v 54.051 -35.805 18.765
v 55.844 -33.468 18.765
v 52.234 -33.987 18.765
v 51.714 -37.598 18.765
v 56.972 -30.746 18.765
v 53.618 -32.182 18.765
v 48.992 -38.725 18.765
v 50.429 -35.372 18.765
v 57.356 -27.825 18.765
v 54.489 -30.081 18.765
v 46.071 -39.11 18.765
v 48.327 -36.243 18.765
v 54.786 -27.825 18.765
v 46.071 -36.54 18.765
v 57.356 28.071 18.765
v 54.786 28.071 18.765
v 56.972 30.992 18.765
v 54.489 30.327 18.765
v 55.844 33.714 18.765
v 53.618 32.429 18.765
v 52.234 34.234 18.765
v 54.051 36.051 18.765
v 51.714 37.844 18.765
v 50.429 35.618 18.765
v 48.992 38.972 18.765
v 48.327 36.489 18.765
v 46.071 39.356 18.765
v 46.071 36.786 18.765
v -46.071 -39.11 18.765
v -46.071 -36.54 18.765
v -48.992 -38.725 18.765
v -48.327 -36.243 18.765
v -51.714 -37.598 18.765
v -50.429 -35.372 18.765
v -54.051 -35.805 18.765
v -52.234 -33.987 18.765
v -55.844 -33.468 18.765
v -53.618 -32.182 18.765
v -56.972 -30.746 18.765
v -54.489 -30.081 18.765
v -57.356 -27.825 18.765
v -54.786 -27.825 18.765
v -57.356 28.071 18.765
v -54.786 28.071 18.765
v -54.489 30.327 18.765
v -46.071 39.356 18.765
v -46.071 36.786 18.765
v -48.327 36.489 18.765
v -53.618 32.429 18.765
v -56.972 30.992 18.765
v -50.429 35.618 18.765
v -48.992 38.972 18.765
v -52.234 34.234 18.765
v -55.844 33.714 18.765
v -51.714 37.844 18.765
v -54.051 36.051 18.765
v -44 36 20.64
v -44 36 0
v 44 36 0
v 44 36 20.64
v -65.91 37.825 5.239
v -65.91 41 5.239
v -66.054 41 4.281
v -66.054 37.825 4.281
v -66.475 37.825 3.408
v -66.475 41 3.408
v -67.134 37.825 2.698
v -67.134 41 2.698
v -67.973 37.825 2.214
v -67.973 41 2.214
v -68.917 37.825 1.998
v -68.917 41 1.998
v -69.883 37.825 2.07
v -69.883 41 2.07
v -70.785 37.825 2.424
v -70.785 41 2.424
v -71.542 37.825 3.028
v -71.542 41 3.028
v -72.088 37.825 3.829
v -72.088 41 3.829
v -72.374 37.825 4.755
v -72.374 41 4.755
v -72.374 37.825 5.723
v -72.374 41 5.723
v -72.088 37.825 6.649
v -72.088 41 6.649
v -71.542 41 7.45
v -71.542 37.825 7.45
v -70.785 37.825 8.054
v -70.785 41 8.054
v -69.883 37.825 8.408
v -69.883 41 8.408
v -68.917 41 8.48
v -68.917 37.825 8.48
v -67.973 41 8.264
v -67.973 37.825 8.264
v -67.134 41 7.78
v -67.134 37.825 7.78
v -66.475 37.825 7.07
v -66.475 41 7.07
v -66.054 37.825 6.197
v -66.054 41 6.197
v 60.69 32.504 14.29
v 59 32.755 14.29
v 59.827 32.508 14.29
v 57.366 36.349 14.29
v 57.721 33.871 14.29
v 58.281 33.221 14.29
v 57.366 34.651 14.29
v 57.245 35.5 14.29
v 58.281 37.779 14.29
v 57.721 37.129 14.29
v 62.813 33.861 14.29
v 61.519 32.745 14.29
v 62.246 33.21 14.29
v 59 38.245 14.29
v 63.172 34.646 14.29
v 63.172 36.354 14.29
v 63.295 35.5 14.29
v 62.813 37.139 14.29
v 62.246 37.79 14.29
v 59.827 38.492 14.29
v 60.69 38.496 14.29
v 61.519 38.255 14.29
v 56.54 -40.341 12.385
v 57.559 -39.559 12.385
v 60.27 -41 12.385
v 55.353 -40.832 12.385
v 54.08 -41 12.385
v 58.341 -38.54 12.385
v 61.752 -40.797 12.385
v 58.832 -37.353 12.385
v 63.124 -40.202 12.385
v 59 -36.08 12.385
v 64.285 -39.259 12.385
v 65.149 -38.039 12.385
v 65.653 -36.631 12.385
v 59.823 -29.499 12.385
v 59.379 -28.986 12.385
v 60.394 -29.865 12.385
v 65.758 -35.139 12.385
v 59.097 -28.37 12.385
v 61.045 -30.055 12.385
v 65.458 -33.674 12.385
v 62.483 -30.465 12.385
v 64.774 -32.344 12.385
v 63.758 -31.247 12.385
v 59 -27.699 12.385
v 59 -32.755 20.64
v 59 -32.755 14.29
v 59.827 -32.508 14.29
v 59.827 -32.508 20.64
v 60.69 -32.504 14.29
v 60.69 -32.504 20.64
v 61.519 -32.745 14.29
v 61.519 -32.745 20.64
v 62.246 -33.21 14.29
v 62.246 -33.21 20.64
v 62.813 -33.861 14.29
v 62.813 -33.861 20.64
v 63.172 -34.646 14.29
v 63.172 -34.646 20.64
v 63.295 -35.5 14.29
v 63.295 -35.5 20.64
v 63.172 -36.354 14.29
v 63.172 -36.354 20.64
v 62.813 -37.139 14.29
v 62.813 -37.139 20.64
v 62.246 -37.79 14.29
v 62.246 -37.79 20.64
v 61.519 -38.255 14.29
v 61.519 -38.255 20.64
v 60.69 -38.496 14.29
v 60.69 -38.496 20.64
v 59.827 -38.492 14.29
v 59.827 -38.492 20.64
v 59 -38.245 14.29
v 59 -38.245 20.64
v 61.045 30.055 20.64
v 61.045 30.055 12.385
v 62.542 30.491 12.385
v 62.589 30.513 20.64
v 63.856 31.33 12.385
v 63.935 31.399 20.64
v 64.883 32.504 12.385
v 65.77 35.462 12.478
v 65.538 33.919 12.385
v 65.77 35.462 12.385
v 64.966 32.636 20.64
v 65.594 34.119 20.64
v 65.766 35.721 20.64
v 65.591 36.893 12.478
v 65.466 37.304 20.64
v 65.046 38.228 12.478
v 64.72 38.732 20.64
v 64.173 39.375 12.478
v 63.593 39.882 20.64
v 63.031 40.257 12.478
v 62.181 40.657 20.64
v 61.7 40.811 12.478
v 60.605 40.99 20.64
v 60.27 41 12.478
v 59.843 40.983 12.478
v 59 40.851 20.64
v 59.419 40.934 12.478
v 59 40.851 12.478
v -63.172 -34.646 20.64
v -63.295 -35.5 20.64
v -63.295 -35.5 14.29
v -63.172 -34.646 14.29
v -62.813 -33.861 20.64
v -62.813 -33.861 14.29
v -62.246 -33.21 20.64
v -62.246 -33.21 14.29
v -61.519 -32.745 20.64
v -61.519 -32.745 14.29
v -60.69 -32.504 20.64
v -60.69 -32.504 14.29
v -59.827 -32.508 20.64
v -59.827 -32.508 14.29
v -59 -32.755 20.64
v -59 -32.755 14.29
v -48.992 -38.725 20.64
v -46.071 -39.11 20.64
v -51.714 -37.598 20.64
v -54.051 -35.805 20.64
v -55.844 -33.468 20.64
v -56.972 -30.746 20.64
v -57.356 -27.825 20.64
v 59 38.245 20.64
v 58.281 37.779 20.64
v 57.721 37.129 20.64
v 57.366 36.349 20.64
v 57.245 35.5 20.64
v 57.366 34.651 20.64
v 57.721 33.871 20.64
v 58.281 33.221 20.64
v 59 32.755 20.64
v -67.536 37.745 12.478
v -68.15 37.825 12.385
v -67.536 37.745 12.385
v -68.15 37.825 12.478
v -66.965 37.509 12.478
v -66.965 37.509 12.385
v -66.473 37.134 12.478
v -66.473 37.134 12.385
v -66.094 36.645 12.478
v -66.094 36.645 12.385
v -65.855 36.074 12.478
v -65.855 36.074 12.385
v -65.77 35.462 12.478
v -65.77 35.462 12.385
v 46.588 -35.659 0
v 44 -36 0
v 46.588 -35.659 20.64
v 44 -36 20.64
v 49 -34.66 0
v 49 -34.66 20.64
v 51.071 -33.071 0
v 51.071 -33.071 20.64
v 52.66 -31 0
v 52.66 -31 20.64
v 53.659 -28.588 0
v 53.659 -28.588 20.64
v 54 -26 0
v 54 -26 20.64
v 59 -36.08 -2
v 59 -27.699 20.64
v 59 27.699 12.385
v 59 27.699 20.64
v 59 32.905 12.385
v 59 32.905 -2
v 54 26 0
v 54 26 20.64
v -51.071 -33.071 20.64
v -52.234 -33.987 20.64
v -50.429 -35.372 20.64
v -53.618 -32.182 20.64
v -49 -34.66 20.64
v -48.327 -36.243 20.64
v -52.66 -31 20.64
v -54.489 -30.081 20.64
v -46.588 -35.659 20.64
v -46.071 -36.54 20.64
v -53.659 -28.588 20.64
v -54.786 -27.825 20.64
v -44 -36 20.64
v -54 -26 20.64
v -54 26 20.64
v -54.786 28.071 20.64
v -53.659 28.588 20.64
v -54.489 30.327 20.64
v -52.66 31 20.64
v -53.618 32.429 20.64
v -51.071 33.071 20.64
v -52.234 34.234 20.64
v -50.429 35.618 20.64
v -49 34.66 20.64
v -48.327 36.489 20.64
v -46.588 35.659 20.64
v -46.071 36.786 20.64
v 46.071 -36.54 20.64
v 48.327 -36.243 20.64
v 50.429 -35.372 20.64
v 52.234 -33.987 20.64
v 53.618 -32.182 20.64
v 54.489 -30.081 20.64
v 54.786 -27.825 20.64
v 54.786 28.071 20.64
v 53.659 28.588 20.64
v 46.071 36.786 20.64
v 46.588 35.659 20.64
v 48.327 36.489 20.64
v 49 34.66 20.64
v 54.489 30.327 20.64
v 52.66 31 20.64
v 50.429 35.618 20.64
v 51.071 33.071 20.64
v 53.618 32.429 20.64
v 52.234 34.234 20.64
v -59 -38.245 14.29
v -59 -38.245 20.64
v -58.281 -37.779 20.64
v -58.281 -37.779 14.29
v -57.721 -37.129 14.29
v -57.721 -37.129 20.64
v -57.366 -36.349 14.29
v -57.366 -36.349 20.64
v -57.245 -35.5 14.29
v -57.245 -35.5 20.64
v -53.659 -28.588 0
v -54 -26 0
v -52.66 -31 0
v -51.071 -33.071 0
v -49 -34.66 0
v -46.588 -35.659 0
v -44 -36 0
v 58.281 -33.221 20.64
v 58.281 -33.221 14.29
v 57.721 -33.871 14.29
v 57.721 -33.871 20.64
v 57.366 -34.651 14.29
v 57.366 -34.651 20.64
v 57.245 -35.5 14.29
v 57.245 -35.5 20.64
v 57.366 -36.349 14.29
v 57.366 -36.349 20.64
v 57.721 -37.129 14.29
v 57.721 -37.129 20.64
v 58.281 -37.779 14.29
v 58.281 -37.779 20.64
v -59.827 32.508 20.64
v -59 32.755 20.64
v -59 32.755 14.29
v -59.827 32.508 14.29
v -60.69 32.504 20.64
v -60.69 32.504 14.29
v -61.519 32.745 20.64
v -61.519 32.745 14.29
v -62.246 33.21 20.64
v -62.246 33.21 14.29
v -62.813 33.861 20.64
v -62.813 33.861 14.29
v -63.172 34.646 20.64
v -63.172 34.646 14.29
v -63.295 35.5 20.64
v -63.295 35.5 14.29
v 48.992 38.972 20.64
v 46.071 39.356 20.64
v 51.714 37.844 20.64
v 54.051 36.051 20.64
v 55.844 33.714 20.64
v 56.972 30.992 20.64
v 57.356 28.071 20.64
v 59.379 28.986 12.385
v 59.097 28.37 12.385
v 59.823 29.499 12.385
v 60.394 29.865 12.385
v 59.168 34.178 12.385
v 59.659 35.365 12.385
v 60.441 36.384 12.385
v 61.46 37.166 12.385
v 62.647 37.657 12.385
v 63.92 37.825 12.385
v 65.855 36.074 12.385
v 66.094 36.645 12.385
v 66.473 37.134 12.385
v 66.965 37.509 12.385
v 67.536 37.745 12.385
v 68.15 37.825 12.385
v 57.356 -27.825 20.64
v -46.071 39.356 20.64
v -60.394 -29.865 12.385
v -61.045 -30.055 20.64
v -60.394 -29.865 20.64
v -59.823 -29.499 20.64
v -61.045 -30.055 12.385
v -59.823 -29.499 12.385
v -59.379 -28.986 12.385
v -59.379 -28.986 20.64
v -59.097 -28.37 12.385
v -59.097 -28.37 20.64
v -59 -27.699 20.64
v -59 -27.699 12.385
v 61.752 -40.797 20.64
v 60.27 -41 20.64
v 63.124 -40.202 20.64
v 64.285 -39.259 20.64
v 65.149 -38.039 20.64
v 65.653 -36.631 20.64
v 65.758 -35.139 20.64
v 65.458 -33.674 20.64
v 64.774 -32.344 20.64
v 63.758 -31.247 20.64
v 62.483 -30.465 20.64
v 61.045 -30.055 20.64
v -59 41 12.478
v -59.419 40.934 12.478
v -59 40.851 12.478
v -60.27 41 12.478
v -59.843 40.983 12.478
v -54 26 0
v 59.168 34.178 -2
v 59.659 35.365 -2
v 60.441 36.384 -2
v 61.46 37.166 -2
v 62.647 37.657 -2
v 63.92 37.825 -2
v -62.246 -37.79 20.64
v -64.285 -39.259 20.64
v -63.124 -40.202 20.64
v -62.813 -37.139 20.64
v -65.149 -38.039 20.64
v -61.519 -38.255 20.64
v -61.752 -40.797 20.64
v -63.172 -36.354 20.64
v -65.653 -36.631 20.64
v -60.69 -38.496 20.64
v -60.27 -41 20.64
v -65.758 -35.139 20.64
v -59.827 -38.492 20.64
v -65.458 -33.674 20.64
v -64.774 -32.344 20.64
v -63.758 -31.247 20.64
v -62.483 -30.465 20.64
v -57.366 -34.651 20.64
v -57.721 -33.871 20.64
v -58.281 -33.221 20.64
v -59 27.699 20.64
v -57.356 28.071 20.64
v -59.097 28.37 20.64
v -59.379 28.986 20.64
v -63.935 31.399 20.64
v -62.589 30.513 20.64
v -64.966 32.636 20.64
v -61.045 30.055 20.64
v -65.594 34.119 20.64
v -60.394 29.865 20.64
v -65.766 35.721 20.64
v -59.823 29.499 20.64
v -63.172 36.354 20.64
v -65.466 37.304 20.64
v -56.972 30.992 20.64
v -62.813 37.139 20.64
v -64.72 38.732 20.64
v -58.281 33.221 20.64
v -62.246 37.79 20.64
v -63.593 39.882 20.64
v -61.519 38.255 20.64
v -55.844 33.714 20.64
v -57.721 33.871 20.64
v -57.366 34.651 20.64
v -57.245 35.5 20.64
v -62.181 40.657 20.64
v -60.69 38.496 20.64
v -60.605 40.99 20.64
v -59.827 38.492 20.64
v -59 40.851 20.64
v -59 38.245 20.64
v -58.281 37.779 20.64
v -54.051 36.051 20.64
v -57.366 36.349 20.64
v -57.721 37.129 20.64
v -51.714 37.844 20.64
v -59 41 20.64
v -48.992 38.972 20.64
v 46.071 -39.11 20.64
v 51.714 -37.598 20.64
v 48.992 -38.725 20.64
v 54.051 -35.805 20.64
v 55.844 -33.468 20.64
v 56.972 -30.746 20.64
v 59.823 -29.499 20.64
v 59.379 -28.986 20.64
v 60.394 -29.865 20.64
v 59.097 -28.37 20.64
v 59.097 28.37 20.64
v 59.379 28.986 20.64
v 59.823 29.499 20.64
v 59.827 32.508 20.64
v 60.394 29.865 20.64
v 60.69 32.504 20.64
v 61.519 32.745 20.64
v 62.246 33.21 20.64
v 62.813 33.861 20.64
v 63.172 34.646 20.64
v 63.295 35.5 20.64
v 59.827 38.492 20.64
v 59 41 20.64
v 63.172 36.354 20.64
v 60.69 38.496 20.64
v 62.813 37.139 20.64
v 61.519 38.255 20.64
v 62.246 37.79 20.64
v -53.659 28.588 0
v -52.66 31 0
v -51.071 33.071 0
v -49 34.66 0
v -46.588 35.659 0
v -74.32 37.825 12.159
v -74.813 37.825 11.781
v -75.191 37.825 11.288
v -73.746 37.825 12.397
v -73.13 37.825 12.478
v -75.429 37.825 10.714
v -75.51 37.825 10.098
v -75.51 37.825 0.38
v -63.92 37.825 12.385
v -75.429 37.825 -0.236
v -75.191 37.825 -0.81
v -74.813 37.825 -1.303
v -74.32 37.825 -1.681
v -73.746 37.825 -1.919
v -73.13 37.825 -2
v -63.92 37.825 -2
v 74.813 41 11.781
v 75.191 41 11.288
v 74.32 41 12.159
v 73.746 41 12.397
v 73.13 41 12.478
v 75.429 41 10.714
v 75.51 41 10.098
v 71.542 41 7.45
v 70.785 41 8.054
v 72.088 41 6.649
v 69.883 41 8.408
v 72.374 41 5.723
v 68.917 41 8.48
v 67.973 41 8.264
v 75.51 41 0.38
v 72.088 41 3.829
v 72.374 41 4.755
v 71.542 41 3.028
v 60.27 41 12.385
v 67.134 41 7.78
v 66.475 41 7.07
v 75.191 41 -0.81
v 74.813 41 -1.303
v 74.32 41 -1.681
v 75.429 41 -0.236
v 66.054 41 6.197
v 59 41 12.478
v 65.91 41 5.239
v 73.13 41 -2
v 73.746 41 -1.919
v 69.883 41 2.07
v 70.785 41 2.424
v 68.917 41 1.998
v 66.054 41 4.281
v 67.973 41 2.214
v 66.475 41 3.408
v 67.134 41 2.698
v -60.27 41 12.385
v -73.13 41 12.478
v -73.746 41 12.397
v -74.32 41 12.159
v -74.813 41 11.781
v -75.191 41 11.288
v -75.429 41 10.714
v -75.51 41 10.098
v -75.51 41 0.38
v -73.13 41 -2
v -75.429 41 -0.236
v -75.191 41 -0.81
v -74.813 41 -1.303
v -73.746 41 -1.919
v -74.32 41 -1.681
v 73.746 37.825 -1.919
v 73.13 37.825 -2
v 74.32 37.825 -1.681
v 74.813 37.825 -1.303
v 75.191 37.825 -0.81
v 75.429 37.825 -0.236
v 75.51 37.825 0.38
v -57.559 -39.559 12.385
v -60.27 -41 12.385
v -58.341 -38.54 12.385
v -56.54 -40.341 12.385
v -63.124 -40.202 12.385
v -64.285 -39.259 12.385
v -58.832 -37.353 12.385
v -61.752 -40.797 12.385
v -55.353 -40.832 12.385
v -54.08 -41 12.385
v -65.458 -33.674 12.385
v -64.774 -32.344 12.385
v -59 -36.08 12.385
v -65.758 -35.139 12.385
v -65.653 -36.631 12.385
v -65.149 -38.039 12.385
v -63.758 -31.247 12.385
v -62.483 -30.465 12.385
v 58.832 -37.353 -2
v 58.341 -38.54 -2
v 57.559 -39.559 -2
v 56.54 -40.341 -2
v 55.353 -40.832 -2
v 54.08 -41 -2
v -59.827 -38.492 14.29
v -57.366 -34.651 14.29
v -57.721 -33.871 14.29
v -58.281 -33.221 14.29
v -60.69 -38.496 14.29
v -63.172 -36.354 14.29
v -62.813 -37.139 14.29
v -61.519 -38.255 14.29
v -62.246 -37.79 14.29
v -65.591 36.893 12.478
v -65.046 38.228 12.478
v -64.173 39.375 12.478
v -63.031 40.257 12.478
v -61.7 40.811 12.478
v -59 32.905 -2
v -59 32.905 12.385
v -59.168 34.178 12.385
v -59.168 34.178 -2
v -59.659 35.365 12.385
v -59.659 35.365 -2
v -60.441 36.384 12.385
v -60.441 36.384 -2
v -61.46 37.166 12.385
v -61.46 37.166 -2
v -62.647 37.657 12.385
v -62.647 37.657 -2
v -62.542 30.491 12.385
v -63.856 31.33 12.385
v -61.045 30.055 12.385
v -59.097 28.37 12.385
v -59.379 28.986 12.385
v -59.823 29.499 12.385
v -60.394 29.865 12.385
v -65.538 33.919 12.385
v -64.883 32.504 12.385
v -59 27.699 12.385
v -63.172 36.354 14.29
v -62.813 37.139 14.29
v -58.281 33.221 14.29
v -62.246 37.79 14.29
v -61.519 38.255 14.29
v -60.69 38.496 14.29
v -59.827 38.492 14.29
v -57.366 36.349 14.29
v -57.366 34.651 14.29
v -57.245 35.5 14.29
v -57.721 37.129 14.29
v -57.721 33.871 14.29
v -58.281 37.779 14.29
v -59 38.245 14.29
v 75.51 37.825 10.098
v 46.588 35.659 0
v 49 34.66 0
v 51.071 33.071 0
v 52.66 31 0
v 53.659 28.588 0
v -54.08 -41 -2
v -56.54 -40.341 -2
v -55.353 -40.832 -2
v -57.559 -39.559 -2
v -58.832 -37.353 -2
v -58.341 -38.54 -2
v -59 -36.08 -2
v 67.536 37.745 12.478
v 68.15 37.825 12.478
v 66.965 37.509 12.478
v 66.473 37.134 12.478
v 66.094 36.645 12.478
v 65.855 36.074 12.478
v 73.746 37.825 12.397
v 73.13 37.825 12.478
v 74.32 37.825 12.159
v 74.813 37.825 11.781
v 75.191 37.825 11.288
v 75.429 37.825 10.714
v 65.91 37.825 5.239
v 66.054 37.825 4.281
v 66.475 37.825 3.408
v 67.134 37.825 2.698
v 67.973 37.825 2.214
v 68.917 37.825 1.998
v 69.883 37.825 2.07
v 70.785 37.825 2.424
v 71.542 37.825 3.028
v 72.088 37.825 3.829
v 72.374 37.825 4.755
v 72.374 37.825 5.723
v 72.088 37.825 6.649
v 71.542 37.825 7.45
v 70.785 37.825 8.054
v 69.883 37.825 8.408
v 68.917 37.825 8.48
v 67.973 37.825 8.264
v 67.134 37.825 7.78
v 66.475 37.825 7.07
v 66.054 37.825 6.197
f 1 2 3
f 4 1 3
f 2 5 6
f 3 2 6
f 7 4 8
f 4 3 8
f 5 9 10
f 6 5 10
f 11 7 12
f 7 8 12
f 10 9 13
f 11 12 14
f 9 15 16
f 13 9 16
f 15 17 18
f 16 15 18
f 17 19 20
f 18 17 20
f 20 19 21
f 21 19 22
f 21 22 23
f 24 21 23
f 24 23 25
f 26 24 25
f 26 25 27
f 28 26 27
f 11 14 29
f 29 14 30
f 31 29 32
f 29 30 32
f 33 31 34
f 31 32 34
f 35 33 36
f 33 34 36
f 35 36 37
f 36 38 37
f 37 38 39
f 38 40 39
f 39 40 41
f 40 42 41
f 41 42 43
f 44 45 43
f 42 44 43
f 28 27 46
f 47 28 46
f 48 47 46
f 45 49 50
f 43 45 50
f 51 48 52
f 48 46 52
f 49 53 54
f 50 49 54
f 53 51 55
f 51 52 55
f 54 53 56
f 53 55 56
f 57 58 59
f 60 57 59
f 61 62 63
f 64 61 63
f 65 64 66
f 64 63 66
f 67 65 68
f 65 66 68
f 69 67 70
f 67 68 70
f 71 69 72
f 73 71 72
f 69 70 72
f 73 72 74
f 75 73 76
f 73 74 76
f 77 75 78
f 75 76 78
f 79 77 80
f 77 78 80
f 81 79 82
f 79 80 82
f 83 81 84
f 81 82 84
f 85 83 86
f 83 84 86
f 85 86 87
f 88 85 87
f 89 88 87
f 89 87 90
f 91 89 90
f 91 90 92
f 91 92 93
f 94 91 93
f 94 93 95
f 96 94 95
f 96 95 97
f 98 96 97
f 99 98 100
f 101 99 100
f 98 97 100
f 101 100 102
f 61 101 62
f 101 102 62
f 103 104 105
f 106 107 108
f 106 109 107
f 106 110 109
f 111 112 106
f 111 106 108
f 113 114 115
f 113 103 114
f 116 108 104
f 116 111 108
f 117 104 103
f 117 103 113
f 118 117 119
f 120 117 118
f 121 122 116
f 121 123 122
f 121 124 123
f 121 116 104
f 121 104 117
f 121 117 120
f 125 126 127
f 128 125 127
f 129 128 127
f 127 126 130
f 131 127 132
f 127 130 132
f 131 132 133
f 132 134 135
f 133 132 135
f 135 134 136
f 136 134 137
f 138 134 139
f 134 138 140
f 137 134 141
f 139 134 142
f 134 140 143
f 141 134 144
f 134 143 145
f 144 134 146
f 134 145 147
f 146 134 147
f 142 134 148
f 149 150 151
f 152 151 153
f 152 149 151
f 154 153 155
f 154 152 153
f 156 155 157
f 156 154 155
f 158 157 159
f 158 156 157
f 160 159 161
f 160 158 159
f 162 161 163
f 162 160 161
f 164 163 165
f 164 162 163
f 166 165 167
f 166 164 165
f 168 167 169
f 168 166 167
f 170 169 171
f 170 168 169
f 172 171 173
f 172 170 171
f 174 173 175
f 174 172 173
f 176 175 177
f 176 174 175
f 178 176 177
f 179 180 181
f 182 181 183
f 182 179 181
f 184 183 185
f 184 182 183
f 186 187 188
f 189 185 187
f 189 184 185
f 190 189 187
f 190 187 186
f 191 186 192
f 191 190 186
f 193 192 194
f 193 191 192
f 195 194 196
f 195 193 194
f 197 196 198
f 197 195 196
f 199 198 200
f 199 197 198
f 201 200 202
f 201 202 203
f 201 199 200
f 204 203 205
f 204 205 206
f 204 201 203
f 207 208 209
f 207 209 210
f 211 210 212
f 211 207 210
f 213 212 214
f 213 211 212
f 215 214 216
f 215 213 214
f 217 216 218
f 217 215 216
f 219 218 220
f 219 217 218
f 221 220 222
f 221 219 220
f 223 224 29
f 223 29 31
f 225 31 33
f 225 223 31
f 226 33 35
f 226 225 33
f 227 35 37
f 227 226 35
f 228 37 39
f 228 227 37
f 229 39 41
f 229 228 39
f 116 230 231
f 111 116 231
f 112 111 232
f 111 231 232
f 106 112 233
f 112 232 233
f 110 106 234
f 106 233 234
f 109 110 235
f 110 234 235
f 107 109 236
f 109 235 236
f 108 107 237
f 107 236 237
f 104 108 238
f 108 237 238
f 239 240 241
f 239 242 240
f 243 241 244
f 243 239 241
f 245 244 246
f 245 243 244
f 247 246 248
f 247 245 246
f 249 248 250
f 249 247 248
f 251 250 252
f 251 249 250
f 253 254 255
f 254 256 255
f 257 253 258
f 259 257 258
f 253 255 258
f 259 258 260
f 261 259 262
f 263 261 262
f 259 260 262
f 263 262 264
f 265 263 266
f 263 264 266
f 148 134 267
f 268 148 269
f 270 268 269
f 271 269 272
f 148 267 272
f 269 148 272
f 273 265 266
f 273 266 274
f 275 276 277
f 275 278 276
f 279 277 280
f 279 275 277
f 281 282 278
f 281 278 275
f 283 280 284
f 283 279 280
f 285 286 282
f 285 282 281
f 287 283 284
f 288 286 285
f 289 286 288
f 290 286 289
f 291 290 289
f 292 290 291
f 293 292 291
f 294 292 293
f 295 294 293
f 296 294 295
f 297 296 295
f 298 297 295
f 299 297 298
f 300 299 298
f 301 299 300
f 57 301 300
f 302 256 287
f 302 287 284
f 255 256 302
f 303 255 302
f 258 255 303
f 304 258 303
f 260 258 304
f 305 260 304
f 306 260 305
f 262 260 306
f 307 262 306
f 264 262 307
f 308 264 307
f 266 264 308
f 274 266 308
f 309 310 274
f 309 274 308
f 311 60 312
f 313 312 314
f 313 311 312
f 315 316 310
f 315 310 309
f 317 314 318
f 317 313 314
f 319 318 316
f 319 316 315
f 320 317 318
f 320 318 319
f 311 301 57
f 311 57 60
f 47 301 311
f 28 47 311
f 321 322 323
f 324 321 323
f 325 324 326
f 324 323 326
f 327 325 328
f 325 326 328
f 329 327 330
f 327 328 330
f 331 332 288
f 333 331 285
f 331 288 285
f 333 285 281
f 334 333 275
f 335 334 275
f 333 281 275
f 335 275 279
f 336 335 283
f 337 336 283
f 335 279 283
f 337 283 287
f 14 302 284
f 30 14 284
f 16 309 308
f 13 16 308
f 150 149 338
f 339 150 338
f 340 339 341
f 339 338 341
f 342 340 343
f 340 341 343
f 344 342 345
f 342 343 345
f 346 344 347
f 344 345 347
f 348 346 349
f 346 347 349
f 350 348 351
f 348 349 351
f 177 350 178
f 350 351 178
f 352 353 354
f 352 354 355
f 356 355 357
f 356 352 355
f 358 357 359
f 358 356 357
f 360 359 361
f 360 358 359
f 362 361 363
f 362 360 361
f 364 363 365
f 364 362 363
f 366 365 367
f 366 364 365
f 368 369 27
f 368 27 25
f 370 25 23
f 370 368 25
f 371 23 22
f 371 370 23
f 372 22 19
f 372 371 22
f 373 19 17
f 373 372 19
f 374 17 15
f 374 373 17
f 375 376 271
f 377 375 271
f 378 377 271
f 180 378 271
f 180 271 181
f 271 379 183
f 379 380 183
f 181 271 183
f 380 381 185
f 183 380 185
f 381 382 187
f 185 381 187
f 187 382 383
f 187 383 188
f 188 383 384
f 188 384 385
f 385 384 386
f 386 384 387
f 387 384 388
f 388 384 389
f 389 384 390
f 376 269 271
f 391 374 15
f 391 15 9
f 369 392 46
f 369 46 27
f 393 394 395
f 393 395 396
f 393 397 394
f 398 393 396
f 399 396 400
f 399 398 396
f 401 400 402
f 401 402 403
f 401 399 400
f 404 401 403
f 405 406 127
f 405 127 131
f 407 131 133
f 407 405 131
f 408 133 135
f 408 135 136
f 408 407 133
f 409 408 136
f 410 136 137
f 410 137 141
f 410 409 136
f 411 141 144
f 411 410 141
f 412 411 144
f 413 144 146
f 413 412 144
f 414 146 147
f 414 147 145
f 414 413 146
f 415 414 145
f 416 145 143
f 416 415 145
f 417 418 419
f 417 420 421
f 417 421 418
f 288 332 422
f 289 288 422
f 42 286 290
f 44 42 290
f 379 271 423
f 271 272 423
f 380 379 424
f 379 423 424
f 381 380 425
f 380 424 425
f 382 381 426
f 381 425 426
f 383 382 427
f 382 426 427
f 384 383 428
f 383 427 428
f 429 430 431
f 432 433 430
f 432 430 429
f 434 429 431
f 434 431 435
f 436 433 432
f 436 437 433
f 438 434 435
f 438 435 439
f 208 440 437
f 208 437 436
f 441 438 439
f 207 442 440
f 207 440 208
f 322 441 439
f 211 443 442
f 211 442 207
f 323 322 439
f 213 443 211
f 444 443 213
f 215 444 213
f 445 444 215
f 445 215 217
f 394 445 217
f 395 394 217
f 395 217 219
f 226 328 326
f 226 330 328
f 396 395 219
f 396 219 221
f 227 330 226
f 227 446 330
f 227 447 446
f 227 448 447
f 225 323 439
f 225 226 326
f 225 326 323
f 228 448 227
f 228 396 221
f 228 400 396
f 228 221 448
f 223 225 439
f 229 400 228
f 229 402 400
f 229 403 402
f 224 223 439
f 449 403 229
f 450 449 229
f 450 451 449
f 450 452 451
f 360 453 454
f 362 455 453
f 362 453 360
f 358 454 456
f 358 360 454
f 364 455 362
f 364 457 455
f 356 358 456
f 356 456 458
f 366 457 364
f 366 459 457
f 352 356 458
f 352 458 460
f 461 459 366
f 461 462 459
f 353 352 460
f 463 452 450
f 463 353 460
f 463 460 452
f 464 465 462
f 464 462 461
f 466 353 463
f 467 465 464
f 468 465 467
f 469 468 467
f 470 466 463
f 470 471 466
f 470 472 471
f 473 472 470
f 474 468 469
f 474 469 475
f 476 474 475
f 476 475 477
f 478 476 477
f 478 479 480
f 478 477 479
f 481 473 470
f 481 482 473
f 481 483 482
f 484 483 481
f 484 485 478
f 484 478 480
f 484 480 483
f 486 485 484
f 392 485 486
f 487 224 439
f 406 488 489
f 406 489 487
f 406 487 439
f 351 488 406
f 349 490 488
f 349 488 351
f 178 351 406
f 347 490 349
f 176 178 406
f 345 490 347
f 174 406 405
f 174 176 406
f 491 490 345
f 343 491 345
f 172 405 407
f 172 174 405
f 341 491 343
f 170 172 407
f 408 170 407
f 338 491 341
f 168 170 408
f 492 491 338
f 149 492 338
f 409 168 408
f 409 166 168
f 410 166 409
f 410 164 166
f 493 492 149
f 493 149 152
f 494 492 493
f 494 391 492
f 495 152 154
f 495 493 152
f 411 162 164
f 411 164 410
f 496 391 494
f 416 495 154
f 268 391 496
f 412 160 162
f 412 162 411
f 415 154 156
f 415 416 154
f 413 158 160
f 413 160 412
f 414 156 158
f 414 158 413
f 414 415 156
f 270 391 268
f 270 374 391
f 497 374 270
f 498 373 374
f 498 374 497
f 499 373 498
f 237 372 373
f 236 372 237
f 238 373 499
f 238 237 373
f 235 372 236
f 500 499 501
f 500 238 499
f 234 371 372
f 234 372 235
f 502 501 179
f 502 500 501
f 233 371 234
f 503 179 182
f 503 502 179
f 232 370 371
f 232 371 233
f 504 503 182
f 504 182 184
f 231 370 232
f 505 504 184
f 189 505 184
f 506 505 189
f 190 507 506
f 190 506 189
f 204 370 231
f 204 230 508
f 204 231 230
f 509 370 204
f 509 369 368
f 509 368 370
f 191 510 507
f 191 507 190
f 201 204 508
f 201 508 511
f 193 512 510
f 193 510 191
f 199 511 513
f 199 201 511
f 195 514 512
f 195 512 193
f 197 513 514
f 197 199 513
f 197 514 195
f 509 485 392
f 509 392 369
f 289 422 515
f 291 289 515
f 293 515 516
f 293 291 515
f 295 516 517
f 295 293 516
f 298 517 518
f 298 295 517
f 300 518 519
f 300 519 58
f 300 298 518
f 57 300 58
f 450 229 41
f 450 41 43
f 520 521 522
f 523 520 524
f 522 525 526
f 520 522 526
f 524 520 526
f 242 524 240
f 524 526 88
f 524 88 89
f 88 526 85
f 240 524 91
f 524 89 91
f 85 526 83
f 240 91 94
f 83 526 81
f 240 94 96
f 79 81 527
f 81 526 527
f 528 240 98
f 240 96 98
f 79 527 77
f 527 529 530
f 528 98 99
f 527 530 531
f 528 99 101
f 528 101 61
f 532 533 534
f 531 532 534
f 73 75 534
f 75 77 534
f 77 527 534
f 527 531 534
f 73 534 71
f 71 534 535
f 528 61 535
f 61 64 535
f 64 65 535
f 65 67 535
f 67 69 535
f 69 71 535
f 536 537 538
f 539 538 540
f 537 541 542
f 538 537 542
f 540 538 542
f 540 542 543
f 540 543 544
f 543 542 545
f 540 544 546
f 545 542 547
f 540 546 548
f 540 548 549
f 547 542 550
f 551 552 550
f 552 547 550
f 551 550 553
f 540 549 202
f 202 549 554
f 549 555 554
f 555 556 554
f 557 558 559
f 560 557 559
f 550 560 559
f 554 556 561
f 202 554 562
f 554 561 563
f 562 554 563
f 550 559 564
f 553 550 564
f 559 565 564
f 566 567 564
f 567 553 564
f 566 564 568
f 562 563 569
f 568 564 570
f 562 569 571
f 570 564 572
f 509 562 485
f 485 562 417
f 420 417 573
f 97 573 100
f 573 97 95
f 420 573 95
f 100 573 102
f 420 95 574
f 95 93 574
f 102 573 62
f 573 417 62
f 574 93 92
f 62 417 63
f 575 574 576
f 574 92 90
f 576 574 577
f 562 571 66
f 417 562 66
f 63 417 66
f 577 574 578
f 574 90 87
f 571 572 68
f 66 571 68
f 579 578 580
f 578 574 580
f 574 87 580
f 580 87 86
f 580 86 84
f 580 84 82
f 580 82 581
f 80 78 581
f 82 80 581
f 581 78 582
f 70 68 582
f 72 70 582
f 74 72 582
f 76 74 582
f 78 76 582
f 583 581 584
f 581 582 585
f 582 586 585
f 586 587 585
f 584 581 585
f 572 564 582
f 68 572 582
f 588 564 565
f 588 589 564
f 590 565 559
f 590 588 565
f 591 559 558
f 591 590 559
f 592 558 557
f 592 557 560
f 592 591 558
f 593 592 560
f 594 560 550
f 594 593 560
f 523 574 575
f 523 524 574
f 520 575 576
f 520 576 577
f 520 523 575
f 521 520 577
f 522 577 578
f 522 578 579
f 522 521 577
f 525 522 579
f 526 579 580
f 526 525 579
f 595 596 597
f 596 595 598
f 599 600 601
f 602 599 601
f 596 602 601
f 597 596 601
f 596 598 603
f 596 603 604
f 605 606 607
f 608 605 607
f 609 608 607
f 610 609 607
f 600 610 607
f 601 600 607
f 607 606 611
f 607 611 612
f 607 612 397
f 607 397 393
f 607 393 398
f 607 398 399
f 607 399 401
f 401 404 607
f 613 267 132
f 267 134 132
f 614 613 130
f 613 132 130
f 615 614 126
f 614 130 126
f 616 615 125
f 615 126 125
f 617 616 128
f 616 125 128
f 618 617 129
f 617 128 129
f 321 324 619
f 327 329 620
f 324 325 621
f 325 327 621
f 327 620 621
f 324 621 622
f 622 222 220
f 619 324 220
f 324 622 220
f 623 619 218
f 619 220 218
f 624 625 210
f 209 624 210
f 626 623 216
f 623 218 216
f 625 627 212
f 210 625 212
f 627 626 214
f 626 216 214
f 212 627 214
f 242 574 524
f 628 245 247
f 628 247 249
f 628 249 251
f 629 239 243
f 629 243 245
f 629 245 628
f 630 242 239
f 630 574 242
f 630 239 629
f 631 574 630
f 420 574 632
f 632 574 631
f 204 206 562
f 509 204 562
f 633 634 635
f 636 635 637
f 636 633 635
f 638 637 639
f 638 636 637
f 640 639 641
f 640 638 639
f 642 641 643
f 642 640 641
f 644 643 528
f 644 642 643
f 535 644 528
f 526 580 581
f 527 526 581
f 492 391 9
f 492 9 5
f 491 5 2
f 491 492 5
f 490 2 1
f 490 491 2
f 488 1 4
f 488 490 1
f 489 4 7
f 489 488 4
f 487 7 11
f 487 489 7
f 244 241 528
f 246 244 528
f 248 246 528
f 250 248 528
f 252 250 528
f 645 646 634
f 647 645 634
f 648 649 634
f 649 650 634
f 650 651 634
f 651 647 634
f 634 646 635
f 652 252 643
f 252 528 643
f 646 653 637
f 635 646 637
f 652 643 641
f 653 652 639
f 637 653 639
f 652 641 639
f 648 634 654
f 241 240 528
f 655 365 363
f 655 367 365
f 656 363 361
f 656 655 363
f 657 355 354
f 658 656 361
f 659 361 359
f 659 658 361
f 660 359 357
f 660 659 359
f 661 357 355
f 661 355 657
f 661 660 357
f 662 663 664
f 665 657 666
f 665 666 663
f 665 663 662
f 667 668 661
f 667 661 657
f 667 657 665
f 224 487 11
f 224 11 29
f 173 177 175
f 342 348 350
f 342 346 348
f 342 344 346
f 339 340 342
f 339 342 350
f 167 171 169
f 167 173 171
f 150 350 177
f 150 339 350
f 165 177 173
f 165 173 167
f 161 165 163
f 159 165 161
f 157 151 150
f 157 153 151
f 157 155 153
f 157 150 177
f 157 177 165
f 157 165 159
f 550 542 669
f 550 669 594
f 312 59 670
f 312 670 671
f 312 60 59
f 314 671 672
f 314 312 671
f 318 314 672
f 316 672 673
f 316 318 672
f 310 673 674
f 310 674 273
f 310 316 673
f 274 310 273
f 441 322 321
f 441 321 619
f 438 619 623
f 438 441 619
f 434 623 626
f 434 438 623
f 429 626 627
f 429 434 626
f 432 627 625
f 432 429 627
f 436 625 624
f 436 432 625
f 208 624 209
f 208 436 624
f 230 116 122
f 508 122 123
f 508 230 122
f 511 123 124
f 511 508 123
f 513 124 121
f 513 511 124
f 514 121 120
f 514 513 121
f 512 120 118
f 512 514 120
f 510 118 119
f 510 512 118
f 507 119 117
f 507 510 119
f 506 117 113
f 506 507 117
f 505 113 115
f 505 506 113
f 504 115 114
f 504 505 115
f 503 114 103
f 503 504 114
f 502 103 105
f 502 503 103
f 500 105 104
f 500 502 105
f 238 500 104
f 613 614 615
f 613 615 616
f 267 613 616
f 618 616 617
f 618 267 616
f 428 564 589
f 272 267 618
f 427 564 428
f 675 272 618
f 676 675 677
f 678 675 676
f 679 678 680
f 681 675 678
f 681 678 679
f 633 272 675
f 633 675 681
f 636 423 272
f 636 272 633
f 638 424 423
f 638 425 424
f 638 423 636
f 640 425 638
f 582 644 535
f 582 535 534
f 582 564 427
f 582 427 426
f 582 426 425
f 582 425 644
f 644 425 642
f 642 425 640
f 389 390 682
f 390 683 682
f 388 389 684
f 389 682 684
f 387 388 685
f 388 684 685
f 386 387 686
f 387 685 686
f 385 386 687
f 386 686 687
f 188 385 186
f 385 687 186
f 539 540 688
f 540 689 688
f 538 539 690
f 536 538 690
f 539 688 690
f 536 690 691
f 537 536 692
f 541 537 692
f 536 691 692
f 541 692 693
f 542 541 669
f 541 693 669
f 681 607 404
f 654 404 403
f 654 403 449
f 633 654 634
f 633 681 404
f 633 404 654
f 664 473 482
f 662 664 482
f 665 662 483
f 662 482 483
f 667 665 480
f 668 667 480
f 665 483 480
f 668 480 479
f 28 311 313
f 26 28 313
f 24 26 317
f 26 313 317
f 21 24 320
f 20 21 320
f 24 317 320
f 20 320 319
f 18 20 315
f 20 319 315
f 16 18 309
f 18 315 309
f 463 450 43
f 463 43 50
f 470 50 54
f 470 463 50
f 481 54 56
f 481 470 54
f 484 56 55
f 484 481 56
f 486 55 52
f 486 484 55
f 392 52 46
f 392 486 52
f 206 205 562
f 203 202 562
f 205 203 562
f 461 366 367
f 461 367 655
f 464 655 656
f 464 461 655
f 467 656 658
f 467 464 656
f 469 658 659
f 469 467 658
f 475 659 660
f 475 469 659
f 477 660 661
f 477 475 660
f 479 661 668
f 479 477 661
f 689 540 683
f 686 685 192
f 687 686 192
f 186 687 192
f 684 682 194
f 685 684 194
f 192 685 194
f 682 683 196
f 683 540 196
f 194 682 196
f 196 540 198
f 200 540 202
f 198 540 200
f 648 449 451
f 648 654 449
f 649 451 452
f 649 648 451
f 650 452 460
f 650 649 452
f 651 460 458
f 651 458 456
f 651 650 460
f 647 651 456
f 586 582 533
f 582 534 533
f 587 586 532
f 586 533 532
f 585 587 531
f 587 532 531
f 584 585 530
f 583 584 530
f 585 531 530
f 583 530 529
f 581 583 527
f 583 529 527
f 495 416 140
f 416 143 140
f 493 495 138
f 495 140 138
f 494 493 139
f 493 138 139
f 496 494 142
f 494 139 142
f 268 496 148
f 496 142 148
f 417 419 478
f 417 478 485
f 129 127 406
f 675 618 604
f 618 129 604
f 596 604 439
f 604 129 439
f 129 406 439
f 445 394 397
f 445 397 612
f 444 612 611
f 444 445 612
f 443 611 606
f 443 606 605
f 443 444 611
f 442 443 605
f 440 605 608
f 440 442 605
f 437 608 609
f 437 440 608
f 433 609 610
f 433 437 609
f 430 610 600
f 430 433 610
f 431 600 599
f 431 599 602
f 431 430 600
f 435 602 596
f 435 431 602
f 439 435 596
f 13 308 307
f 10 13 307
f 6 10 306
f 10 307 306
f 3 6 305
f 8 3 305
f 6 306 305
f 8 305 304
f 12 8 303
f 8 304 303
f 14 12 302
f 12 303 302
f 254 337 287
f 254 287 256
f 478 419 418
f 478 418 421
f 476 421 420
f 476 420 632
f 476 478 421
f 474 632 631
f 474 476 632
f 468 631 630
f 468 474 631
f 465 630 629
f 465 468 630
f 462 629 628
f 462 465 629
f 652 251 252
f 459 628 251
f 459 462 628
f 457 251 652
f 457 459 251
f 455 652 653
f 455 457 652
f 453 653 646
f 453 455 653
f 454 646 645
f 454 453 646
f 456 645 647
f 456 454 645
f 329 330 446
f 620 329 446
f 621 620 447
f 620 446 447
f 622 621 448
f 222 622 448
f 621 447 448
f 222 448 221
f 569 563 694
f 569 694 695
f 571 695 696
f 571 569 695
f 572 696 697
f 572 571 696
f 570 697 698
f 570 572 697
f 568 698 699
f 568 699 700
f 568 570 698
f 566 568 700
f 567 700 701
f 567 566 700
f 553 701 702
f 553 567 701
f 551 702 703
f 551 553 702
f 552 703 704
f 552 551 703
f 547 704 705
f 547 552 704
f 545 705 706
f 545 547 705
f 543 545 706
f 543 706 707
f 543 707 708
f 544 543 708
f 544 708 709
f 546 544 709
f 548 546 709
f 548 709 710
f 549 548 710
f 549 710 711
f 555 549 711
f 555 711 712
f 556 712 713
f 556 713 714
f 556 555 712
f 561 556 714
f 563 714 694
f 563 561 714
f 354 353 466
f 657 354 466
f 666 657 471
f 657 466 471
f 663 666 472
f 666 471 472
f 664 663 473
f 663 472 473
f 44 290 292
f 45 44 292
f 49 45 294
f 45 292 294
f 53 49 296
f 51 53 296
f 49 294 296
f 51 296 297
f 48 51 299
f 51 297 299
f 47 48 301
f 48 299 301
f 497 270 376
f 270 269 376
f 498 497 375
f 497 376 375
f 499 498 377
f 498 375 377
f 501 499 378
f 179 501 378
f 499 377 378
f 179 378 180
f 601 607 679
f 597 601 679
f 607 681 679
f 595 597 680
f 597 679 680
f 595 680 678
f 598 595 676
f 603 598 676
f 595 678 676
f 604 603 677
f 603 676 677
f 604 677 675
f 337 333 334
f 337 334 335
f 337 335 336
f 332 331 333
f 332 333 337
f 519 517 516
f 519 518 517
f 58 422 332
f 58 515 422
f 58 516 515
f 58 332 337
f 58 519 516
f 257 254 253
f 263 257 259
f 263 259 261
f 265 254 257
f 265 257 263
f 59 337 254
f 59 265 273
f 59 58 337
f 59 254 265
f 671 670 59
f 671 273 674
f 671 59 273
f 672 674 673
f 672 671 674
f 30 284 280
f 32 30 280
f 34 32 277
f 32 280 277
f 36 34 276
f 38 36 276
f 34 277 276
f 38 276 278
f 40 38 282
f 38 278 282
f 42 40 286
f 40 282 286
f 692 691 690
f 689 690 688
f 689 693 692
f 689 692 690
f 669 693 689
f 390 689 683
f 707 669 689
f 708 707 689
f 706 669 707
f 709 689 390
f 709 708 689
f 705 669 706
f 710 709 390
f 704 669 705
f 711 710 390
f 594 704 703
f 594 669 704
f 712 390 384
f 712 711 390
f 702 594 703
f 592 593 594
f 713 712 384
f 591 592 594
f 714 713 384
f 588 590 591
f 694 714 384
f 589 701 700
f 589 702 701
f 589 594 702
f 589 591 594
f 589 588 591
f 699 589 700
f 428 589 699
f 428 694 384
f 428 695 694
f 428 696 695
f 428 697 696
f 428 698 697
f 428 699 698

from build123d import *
from build123d.topology import SkipClean

# Parameters (mm, degrees)
SKETCH2_W           = 108
SKETCH2_H           = 72
BOSS_EXTRUDE1_DEPTH = 20.64
SHELL1_T            = 5
SKETCH3_W           = 118
SKETCH3_H           = 82
CUT_EXTRUDE1_DEPTH  = 3
FILLET1_R           = 10
SKETCH13_W          = 16.51
SKETCH13_H          = 14.478
SKETCH13_R          = 3.249999977
BOSS_EXTRUDE4_DEPTH = 3.175
BOSS_EXTRUDE2_DEPTH = 8.255
CUT_EXTRUDE4_DEPTH  = 6.35
CUT_EXTRUDE2_DEPTH  = 1.875
FILLET3_R           = 2.38
FILLET4_R           = 4.92
FILLET5_R           = 2.38


with BuildPart() as part:
    # Sketch2 → Boss-Extrude1 (new body)
    with BuildSketch(Plane.XY):
        Rectangle(SKETCH2_W, SKETCH2_H)
    extrude(amount=BOSS_EXTRUDE1_DEPTH)

    # Shell1
    shell1_openings = [part.faces().sort_by_distance(p)[0] for p in [
        (0, 0, 20.64),
    ]]
    offset(amount=SHELL1_T, openings=shell1_openings, kind=Kind.INTERSECTION)

    # Sketch3 → Cut-Extrude1 (cut)
    with BuildSketch(Plane(origin=(0, 0, -5), x_dir=(-1, 0, 0), z_dir=(0, 0, -1))):
        Rectangle(SKETCH3_W, SKETCH3_H)
    extrude(amount=-CUT_EXTRUDE1_DEPTH, mode=Mode.SUBTRACT)

    # Fillet1
    fillet1_edges = [part.edges().sort_by_distance(p)[0] for p in [
        (54, -36, 10.32),
        (54, 36, 10.32),
        (-54, 36, 10.32),
        (-54, -36, 10.32),
    ]]
    fillet(fillet1_edges, radius=FILLET1_R)

    # Sketch13 → Boss-Extrude4 (add)
    with BuildSketch(Plane(origin=(0, 41, 0), x_dir=(1, 0, 0), z_dir=(0, 1, 0))):
        with Locations((-67.255, -5.239)):
            Rectangle(SKETCH13_W, SKETCH13_H)
        with Locations((-69.16, -5.239)):
            Circle(SKETCH13_R, mode=Mode.SUBTRACT)
    boss_extrude4 = extrude(amount=-BOSS_EXTRUDE4_DEPTH)

    # Mirror4: Boss-Extrude4 across plane
    add(boss_extrude4.mirror(Plane(origin=(0, 0, 0), x_dir=(0, 0, 1), z_dir=(1, 0, 0))))

    # Sketch6 → Boss-Extrude2 (add)
    with BuildSketch(Plane.XY.offset(20.64)):
        with BuildLine():
            Line((59, -41), (60.27, -41))
            ThreePointArc((60.27, -41), (65.732714697, -34.86066586), (59, -30.148635688))
            Line((59, -30.148635688), (59, -41))
        make_face()
        with BuildLine():
            ThreePointArc((59, 30.148635688), (65.77, 35.5), (59, 40.851364312))
            Line((59, 40.851364312), (59, 30.148635688))
        make_face()
        with BuildLine():
            ThreePointArc((-59, -30.148635688), (-65.77, -35.5), (-59, -40.851364312))
            Line((-59, -40.851364312), (-59, -30.148635688))
        make_face()
        with BuildLine():
            ThreePointArc((-59, 40.851364312), (-65.77, 35.5), (-59, 30.148635688))
            Line((-59, 30.148635688), (-59, 40.851364312))
        make_face()
    boss_extrude2 = extrude(amount=-BOSS_EXTRUDE2_DEPTH)

    # Sketch6<4> → Cut-Extrude4 (cut)
    with BuildSketch(Plane.XY.offset(20.64)):
        with BuildLine():
            Line((59, 38.245491759), (59, 32.754508241))
            ThreePointArc((59, 32.754508241), (61.899244457, 32.951238046), (63.295, 35.5))
            ThreePointArc((63.295, 35.5), (61.899244457, 38.048761954), (59, 38.245491759))
        make_face()
        with BuildLine():
            ThreePointArc((59, 38.245491759), (57.245, 35.5), (59, 32.754508241))
            Line((59, 32.754508241), (59, 38.245491759))
        make_face()
        with BuildLine():
            Line((59, -38.245491759), (59, -32.754508241))
            ThreePointArc((59, -32.754508241), (57.245, -35.5), (59, -38.245491759))
        make_face()
        with BuildLine():
            ThreePointArc((63.295, -35.5), (61.899244457, -32.951238046), (59, -32.754508241))
            Line((59, -32.754508241), (59, -38.245491759))
            ThreePointArc((59, -38.245491759), (61.899244457, -38.048761954), (63.295, -35.5))
        make_face()
        with BuildLine():
            ThreePointArc((-59, -38.245491759), (-57.721238046, -37.129244457), (-57.245, -35.5))
            ThreePointArc((-57.245, -35.5), (-57.721238046, -33.870755543), (-59, -32.754508241))
            Line((-59, -32.754508241), (-59, -38.245491759))
        make_face()
        with BuildLine():
            Line((-59, -38.245491759), (-59, -32.754508241))
            ThreePointArc((-59, -32.754508241), (-63.295, -35.5), (-59, -38.245491759))
        make_face()
        with BuildLine():
            Line((-59, 38.245491759), (-59, 32.754508241))
            ThreePointArc((-59, 32.754508241), (-57.721238046, 33.870755543), (-57.245, 35.5))
            ThreePointArc((-57.245, 35.5), (-57.721238046, 37.129244457), (-59, 38.245491759))
        make_face()
        with BuildLine():
            ThreePointArc((-59, 38.245491759), (-63.295, 35.5), (-59, 32.754508241))
            Line((-59, 32.754508241), (-59, 38.245491759))
        make_face()
    cut_extrude4 = extrude(amount=-CUT_EXTRUDE4_DEPTH, mode=Mode.SUBTRACT)

    # Mirror5: Boss-Extrude2, Cut-Extrude4 across plane
    with SkipClean():  # the faces are left unmerged after this step: merging them gives an invalid solid
        add(boss_extrude2.mirror(Plane(origin=(0, 0, 0), x_dir=(0, 0, 1), z_dir=(1, 0, 0))))
        add(cut_extrude4.mirror(Plane(origin=(0, 0, 0), x_dir=(0, 0, 1), z_dir=(1, 0, 0))), mode=Mode.SUBTRACT)

    # Sketch5 → Cut-Extrude2 (cut)
    with SkipClean():  # the faces are left unmerged after this step: merging them gives an invalid solid
        with BuildSketch(Plane.XY.offset(20.64)):
            with BuildLine():
                Line((46.071067812, -39.11), (-46.071067812, -39.11))
                ThreePointArc((-46.071067812, -39.11), (-54.050767838, -35.804700026), (-57.356067812, -27.825))
                Line((-57.356067812, -27.825), (-57.356067812, 28.071067812))
                ThreePointArc((-57.356067812, 28.071067812), (-54.050767838, 36.050767838), (-46.071067812, 39.356067812))
                Line((-46.071067812, 39.356067812), (46.071067812, 39.356067812))
                ThreePointArc((46.071067812, 39.356067812), (54.050767838, 36.050767838), (57.356067812, 28.071067812))
                Line((57.356067812, 28.071067812), (57.356067812, -27.825))
                ThreePointArc((57.356067812, -27.825), (54.050767838, -35.804700026), (46.071067812, -39.11))
            make_face()
            with BuildLine():
                Line((46.071067812, -36.54), (-46.071067812, -36.54))
                ThreePointArc((-46.071067812, -36.54), (-52.23350341, -33.987435598), (-54.786067812, -27.825))
                Line((-54.786067812, -27.825), (-54.786067812, 28.071067812))
                ThreePointArc((-54.786067812, 28.071067812), (-52.23350341, 34.23350341), (-46.071067812, 36.786067812))
                Line((-46.071067812, 36.786067812), (46.071067812, 36.786067812))
                ThreePointArc((46.071067812, 36.786067812), (52.23350341, 34.23350341), (54.786067812, 28.071067812))
                Line((54.786067812, 28.071067812), (54.786067812, -27.825))
                ThreePointArc((54.786067812, -27.825), (52.23350341, -33.987435598), (46.071067812, -36.54))
            make_face(mode=Mode.SUBTRACT)
        extrude(amount=-CUT_EXTRUDE2_DEPTH, mode=Mode.SUBTRACT)

    # Fillet3
    fillet3_edges = [part.edges().sort_by_distance(p)[0] for p in [
        (59, -30.148635688, 16.5125),
        (-65.254413205, 37.825, 12.4315),
        (-59, 30.148635688, 16.5125),
        (-59, -30.148635688, 16.5125),
        (65.254413205, 37.825, 12.4315),
        (59, 30.148635688, 16.5125),
    ]]
    fillet(fillet3_edges, radius=FILLET3_R)

    # Fillet4
    fillet4_edges = [part.edges().sort_by_distance(p)[0] for p in [
        (59, -41, 5.1925),
        (-59, -41, 5.1925),
        (-59, 37.825, 5.1925),
        (59, 37.825, 5.1925),
    ]]
    fillet(fillet4_edges, radius=FILLET4_R)

    # Fillet5
    fillet5_edges = [part.edges().sort_by_distance(p)[0] for p in [
        (-75.51, 39.4125, 12.478),
        (-75.51, 39.4125, -2),
        (75.51, 39.4125, -2),
        (75.51, 39.4125, 12.478),
    ]]
    fillet(fillet5_edges, radius=FILLET5_R)


solid = part.part
